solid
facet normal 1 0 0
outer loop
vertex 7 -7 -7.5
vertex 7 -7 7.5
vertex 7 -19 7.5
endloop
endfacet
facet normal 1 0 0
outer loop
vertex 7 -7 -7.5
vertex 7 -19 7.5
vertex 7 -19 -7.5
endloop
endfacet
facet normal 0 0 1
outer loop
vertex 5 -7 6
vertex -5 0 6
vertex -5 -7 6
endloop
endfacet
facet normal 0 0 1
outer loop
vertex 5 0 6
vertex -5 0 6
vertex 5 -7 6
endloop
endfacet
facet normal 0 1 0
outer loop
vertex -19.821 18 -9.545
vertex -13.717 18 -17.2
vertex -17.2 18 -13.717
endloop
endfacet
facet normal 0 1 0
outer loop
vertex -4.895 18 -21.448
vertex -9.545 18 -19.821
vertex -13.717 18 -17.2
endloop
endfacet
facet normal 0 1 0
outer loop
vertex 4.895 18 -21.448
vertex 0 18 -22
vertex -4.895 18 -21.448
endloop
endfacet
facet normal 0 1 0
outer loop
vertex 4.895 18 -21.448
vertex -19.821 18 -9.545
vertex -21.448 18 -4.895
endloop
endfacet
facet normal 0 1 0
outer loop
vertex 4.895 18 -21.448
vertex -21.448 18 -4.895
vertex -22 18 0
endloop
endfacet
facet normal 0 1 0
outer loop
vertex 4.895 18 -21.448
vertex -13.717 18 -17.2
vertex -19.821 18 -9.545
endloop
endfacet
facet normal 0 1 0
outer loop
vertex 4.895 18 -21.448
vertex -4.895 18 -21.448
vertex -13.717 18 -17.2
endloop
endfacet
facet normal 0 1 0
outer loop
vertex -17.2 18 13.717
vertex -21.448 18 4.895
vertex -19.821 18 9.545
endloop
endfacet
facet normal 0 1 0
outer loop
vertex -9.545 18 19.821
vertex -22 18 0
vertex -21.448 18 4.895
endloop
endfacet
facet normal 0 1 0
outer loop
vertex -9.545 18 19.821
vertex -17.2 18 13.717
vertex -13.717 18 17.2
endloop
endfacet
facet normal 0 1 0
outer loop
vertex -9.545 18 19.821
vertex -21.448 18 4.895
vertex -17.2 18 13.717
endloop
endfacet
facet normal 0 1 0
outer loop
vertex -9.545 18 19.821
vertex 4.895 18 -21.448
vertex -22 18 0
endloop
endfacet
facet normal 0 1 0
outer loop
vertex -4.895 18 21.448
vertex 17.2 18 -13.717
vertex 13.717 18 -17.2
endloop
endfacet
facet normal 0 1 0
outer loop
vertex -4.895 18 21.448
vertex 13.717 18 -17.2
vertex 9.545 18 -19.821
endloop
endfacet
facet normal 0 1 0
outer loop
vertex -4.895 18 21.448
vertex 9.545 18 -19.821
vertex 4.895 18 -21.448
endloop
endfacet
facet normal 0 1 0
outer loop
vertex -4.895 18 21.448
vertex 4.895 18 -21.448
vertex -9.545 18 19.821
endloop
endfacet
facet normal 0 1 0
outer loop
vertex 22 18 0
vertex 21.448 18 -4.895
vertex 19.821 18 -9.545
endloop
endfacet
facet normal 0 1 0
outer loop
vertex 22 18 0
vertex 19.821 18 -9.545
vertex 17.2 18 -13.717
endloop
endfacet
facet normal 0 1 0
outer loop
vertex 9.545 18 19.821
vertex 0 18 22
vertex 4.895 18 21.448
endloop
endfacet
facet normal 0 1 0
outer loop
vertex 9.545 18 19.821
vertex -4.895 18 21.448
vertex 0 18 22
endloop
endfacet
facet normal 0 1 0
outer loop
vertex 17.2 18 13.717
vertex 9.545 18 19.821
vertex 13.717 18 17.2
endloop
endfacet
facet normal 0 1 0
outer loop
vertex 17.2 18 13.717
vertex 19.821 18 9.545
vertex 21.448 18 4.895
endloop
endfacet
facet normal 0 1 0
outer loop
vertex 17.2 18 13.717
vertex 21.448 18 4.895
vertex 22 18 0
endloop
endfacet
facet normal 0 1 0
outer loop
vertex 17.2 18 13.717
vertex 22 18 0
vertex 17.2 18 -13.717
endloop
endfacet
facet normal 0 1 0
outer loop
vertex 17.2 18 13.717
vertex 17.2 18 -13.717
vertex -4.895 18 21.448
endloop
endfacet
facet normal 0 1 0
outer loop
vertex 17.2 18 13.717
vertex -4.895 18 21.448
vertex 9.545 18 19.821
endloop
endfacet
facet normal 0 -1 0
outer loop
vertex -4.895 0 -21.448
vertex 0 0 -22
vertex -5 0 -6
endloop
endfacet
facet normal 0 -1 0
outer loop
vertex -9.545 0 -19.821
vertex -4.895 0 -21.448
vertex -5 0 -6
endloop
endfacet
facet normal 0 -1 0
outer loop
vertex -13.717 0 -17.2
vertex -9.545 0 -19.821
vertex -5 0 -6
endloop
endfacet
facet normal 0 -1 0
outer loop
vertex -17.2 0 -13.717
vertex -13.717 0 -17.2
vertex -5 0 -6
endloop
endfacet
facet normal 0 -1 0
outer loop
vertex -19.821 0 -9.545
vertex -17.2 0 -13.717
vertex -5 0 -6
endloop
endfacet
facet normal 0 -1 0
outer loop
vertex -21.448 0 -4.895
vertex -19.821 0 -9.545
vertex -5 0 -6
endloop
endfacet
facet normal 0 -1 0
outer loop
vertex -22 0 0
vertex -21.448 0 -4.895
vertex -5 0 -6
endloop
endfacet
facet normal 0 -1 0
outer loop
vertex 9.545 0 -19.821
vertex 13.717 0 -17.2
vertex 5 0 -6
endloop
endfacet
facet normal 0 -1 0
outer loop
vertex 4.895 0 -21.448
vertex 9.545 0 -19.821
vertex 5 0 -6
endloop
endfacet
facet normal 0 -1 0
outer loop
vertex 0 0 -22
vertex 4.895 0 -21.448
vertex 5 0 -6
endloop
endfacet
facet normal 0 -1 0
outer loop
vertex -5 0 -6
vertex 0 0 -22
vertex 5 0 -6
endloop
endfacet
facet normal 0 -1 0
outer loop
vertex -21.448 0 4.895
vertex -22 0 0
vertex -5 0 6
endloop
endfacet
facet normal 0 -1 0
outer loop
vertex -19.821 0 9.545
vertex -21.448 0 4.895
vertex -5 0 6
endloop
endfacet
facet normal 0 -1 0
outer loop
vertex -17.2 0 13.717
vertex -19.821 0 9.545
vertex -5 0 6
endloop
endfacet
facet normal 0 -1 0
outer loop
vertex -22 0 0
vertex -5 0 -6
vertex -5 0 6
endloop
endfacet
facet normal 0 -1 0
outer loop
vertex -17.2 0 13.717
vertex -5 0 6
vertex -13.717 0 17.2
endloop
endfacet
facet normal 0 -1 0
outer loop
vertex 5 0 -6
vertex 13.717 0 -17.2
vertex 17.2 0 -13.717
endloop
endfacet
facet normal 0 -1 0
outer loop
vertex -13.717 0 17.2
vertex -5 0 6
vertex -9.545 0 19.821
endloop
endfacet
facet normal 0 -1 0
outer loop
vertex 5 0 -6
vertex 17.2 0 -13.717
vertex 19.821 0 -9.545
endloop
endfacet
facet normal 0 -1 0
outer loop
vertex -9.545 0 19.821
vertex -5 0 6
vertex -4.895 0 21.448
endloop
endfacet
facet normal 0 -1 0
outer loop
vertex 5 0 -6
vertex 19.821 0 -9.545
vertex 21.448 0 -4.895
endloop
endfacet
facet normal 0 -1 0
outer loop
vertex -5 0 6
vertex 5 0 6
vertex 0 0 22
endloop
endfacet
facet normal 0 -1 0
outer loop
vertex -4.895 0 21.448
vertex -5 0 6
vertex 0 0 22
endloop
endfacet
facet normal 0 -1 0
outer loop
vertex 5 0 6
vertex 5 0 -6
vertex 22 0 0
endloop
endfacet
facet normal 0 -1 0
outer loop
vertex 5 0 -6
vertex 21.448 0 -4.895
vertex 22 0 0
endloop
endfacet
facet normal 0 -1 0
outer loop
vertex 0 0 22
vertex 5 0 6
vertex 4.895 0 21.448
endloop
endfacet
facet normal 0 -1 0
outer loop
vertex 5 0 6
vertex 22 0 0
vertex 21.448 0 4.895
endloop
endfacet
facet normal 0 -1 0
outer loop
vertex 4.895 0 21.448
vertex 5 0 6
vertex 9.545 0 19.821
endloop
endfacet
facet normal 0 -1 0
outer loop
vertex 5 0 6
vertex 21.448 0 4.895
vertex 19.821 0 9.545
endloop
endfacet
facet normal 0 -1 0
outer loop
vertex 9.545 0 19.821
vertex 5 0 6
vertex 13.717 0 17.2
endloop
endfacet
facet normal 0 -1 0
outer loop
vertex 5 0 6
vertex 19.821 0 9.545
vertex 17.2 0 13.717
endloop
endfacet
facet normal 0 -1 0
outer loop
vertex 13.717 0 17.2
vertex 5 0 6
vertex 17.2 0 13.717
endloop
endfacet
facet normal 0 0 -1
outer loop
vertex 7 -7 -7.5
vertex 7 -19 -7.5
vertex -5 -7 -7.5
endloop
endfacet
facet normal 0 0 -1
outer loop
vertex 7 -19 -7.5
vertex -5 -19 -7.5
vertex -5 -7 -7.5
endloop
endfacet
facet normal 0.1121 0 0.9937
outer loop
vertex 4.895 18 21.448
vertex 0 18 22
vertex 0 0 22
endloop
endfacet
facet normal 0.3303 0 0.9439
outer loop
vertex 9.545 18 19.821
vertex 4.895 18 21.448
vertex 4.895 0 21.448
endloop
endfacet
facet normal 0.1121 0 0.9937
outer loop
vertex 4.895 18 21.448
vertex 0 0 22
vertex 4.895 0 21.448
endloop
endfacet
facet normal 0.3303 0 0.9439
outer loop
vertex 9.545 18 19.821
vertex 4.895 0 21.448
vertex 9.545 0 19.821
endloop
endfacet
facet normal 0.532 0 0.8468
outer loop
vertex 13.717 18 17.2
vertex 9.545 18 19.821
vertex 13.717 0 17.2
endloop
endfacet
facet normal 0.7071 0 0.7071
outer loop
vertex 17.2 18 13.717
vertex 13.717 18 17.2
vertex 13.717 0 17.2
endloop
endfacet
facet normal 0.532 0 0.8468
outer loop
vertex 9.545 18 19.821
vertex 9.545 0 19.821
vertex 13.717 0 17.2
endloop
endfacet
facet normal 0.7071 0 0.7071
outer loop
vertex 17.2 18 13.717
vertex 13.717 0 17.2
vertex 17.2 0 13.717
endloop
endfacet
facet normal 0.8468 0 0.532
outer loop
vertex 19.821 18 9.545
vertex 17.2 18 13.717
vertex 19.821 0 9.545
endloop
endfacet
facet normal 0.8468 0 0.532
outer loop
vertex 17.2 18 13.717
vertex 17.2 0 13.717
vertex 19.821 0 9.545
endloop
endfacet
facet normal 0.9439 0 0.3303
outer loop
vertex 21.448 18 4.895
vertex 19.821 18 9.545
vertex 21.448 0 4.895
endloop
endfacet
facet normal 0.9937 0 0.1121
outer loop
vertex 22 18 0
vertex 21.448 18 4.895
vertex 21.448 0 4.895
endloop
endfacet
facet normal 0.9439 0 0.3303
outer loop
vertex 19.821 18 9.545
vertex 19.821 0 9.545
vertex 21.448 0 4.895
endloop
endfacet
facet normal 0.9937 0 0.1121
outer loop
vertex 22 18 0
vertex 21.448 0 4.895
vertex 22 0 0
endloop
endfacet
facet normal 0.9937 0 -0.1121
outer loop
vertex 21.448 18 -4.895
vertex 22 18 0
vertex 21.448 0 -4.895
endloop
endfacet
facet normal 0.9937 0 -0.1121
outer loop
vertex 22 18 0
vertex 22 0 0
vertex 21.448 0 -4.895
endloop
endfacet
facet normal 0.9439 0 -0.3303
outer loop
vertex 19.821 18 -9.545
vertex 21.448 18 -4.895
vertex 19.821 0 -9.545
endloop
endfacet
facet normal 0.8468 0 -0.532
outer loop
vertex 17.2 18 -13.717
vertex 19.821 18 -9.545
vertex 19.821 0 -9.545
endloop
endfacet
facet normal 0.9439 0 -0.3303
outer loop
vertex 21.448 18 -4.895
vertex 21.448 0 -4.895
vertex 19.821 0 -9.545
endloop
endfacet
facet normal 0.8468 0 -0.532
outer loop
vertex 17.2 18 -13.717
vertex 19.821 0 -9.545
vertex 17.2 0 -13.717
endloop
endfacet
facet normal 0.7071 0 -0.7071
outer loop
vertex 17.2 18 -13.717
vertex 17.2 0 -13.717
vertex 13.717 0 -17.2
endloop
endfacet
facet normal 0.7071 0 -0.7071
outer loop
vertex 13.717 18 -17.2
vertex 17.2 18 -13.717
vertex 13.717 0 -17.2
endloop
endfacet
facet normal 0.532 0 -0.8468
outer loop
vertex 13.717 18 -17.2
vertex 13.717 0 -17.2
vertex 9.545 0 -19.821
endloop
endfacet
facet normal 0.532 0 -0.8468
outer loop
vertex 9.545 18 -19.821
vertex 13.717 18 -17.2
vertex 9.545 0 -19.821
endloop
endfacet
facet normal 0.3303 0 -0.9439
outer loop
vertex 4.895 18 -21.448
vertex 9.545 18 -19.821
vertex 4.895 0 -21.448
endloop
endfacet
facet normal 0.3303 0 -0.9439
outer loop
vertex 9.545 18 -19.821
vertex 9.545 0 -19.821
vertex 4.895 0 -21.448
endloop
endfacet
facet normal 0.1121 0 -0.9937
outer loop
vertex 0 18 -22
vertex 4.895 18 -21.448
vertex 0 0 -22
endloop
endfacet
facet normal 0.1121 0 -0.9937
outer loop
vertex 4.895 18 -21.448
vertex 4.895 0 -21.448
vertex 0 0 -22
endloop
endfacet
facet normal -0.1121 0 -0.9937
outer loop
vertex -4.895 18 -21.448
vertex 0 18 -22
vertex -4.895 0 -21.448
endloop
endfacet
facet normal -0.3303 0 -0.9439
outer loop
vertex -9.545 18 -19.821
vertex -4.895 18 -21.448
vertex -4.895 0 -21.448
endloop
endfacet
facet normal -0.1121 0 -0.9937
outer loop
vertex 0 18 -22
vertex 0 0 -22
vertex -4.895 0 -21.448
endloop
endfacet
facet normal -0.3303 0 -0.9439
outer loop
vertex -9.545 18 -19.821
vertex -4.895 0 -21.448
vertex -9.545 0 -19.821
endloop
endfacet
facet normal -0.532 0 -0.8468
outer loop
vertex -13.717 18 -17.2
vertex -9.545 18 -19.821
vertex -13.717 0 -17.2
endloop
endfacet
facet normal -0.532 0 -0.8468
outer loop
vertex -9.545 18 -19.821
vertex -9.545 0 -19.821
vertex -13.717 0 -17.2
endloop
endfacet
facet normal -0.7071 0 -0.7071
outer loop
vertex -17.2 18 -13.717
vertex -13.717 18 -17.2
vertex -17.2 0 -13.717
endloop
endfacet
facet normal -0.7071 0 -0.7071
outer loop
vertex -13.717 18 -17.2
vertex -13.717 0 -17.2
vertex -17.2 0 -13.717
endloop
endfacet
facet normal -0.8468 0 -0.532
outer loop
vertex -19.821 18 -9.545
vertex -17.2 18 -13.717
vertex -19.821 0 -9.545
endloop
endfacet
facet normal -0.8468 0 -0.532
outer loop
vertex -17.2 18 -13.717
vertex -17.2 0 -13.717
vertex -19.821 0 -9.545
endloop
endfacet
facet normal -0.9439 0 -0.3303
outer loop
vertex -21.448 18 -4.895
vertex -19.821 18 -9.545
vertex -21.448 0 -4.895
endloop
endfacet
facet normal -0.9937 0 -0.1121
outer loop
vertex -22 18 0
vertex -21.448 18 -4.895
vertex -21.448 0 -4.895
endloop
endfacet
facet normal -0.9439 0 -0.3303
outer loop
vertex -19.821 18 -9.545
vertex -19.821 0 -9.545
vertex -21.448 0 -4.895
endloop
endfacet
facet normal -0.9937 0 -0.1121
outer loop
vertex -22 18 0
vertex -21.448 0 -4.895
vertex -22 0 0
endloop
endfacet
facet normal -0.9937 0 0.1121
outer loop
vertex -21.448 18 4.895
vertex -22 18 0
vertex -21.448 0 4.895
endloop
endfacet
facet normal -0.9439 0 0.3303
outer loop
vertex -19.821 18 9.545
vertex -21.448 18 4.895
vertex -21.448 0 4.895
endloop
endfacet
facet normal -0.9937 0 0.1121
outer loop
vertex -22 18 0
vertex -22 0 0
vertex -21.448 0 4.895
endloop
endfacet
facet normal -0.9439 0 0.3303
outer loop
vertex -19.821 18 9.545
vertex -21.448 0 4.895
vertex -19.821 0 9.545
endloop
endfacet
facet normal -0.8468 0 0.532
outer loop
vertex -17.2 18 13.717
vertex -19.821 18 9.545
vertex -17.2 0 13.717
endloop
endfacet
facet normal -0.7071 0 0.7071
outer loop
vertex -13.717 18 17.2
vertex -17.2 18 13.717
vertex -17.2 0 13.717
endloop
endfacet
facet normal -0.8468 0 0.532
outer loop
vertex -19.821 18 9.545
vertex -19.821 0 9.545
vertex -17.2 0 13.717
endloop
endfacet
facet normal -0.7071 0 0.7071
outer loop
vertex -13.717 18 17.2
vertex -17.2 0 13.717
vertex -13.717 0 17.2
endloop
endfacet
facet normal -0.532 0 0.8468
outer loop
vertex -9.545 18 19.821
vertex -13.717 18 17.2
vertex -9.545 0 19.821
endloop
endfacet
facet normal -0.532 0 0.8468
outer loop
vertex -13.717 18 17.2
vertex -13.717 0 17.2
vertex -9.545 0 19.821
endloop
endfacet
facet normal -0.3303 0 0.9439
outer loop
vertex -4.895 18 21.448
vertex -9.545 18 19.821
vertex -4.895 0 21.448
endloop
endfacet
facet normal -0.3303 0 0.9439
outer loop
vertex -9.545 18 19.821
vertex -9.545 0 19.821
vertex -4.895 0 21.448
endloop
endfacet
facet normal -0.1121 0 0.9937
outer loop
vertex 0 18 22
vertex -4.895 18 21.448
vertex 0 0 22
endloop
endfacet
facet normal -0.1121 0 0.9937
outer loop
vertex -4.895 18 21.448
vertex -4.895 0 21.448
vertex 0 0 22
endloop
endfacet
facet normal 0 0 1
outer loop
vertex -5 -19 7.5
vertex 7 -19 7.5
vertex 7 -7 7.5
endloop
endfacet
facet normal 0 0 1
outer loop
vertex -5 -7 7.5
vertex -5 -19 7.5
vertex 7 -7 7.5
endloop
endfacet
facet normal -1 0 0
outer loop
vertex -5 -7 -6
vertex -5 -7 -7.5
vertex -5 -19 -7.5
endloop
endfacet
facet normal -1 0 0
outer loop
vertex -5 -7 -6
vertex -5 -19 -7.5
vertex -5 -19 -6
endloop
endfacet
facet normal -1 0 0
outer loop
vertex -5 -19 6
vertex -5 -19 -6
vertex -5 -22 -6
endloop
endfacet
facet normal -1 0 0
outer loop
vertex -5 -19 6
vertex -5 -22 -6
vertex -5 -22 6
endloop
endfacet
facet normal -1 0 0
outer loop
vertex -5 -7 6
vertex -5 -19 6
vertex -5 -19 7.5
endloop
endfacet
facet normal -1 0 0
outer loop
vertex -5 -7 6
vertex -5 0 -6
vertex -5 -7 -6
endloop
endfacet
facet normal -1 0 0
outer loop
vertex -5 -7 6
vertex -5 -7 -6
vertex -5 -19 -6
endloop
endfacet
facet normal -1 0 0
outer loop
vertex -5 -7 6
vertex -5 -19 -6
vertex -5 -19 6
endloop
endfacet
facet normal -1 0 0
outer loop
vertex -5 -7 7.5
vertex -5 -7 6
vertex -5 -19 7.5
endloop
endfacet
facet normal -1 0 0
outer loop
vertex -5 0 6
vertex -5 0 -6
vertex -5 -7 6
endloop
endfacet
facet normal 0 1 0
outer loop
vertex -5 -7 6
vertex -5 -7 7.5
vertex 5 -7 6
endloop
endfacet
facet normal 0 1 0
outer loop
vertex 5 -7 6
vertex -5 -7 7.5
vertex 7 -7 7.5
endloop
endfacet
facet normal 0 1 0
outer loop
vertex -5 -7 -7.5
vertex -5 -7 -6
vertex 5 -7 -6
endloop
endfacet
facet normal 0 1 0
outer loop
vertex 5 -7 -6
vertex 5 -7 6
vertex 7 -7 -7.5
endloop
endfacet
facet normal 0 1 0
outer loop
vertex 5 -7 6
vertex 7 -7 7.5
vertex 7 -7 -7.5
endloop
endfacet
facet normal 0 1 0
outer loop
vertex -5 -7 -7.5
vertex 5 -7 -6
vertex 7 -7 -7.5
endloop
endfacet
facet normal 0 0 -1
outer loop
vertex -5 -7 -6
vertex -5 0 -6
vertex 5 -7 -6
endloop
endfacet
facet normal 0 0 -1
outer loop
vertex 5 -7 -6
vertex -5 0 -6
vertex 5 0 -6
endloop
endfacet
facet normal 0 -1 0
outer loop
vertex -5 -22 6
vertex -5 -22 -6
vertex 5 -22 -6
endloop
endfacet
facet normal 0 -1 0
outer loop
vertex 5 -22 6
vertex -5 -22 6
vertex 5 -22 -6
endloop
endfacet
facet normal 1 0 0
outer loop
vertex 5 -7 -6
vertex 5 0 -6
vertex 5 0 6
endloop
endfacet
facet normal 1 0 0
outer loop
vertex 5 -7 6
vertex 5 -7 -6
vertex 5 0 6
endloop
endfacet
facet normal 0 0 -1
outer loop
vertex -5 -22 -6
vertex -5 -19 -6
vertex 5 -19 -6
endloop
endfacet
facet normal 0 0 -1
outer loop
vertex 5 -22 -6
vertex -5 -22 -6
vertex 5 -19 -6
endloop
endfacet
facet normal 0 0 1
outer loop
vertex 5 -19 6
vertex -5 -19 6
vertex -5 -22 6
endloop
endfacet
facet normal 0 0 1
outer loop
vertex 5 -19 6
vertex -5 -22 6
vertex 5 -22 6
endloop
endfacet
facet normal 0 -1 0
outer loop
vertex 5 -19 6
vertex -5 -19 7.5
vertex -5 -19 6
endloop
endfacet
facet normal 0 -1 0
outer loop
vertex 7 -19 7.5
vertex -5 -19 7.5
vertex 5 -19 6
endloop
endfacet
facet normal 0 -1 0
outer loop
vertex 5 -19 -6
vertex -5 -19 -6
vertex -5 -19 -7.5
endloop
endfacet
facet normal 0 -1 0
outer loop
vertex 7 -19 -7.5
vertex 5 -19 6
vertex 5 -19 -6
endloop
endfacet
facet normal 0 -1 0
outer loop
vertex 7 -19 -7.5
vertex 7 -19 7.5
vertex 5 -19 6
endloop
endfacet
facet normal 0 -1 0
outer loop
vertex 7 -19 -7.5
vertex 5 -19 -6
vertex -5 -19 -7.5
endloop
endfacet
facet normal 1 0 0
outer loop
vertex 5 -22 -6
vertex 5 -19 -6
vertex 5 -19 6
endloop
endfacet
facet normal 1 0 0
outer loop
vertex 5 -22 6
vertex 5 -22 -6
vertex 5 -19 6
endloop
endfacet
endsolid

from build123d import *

# Parameters (mm, degrees)
SKETCH_1_R                  = 22
EXTRUDE_1_DEPTH             = 18
SKETCH_2_W                  = 10
SKETCH_2_H                  = 12
EXTRUDE_2_DEPTH             = 22
SKETCH_3_W                  = 15
SKETCH_3_H                  = 12
EXTRUDE_3_DEPTH             = 2
EXTRUDE_3_DIRECTION_2_REACH = 43.195


with BuildPart() as part:
    # 草图1 → 凸台-拉伸1 (new body)
    with BuildSketch(Plane(origin=(0, 0, 0), x_dir=(1, 0, 0), z_dir=(0, 1, 0))):
        with Locations(Location((0, 0, 0), (0, 0, 270))):
            Circle(SKETCH_1_R)
    extrude(amount=EXTRUDE_1_DEPTH)

    # 草图2 → 凸台-拉伸2 (add)
    with BuildSketch(Plane.XZ):
        Rectangle(SKETCH_2_W, SKETCH_2_H)
    extrude(amount=EXTRUDE_2_DEPTH)

    # 草图3 → 凸台-拉伸3 (add)
    with BuildSketch(Plane(origin=(5, 0, 0), x_dir=(0, 0, -1), z_dir=(1, 0, 0))):
        with Locations((0, -13)):
            Rectangle(SKETCH_3_W, SKETCH_3_H)
    extrude(amount=EXTRUDE_3_DEPTH)

    # 凸台-拉伸3 direction 2: up to this face of the body (flat: up to its plane)
    extrude_3_direction_2_end = Plane(part.part.faces().sort_by_distance((-5, -11, 0))[0])
    # 草图3 → 凸台-拉伸3 direction 2 (add, up to the picked face)
    with BuildSketch(Plane(origin=(5, 0, 0), x_dir=(0, 0, -1), z_dir=(1, 0, 0)), mode=Mode.PRIVATE) as extrude_3_direction_2_sk1:
        with Locations((0, -13)):
            Rectangle(SKETCH_3_W, SKETCH_3_H)
    extrude_3_direction_2_tool1 = split(extrude(extrude_3_direction_2_sk1.sketch, amount=-EXTRUDE_3_DIRECTION_2_REACH, mode=Mode.PRIVATE), bisect_by=extrude_3_direction_2_end, keep=Keep.BOTH, mode=Mode.PRIVATE)
    add(extrude_3_direction_2_tool1.solids().sort_by(Axis((5, -13, 0), (-1, 0, 0)))[0])


solid = part.part
